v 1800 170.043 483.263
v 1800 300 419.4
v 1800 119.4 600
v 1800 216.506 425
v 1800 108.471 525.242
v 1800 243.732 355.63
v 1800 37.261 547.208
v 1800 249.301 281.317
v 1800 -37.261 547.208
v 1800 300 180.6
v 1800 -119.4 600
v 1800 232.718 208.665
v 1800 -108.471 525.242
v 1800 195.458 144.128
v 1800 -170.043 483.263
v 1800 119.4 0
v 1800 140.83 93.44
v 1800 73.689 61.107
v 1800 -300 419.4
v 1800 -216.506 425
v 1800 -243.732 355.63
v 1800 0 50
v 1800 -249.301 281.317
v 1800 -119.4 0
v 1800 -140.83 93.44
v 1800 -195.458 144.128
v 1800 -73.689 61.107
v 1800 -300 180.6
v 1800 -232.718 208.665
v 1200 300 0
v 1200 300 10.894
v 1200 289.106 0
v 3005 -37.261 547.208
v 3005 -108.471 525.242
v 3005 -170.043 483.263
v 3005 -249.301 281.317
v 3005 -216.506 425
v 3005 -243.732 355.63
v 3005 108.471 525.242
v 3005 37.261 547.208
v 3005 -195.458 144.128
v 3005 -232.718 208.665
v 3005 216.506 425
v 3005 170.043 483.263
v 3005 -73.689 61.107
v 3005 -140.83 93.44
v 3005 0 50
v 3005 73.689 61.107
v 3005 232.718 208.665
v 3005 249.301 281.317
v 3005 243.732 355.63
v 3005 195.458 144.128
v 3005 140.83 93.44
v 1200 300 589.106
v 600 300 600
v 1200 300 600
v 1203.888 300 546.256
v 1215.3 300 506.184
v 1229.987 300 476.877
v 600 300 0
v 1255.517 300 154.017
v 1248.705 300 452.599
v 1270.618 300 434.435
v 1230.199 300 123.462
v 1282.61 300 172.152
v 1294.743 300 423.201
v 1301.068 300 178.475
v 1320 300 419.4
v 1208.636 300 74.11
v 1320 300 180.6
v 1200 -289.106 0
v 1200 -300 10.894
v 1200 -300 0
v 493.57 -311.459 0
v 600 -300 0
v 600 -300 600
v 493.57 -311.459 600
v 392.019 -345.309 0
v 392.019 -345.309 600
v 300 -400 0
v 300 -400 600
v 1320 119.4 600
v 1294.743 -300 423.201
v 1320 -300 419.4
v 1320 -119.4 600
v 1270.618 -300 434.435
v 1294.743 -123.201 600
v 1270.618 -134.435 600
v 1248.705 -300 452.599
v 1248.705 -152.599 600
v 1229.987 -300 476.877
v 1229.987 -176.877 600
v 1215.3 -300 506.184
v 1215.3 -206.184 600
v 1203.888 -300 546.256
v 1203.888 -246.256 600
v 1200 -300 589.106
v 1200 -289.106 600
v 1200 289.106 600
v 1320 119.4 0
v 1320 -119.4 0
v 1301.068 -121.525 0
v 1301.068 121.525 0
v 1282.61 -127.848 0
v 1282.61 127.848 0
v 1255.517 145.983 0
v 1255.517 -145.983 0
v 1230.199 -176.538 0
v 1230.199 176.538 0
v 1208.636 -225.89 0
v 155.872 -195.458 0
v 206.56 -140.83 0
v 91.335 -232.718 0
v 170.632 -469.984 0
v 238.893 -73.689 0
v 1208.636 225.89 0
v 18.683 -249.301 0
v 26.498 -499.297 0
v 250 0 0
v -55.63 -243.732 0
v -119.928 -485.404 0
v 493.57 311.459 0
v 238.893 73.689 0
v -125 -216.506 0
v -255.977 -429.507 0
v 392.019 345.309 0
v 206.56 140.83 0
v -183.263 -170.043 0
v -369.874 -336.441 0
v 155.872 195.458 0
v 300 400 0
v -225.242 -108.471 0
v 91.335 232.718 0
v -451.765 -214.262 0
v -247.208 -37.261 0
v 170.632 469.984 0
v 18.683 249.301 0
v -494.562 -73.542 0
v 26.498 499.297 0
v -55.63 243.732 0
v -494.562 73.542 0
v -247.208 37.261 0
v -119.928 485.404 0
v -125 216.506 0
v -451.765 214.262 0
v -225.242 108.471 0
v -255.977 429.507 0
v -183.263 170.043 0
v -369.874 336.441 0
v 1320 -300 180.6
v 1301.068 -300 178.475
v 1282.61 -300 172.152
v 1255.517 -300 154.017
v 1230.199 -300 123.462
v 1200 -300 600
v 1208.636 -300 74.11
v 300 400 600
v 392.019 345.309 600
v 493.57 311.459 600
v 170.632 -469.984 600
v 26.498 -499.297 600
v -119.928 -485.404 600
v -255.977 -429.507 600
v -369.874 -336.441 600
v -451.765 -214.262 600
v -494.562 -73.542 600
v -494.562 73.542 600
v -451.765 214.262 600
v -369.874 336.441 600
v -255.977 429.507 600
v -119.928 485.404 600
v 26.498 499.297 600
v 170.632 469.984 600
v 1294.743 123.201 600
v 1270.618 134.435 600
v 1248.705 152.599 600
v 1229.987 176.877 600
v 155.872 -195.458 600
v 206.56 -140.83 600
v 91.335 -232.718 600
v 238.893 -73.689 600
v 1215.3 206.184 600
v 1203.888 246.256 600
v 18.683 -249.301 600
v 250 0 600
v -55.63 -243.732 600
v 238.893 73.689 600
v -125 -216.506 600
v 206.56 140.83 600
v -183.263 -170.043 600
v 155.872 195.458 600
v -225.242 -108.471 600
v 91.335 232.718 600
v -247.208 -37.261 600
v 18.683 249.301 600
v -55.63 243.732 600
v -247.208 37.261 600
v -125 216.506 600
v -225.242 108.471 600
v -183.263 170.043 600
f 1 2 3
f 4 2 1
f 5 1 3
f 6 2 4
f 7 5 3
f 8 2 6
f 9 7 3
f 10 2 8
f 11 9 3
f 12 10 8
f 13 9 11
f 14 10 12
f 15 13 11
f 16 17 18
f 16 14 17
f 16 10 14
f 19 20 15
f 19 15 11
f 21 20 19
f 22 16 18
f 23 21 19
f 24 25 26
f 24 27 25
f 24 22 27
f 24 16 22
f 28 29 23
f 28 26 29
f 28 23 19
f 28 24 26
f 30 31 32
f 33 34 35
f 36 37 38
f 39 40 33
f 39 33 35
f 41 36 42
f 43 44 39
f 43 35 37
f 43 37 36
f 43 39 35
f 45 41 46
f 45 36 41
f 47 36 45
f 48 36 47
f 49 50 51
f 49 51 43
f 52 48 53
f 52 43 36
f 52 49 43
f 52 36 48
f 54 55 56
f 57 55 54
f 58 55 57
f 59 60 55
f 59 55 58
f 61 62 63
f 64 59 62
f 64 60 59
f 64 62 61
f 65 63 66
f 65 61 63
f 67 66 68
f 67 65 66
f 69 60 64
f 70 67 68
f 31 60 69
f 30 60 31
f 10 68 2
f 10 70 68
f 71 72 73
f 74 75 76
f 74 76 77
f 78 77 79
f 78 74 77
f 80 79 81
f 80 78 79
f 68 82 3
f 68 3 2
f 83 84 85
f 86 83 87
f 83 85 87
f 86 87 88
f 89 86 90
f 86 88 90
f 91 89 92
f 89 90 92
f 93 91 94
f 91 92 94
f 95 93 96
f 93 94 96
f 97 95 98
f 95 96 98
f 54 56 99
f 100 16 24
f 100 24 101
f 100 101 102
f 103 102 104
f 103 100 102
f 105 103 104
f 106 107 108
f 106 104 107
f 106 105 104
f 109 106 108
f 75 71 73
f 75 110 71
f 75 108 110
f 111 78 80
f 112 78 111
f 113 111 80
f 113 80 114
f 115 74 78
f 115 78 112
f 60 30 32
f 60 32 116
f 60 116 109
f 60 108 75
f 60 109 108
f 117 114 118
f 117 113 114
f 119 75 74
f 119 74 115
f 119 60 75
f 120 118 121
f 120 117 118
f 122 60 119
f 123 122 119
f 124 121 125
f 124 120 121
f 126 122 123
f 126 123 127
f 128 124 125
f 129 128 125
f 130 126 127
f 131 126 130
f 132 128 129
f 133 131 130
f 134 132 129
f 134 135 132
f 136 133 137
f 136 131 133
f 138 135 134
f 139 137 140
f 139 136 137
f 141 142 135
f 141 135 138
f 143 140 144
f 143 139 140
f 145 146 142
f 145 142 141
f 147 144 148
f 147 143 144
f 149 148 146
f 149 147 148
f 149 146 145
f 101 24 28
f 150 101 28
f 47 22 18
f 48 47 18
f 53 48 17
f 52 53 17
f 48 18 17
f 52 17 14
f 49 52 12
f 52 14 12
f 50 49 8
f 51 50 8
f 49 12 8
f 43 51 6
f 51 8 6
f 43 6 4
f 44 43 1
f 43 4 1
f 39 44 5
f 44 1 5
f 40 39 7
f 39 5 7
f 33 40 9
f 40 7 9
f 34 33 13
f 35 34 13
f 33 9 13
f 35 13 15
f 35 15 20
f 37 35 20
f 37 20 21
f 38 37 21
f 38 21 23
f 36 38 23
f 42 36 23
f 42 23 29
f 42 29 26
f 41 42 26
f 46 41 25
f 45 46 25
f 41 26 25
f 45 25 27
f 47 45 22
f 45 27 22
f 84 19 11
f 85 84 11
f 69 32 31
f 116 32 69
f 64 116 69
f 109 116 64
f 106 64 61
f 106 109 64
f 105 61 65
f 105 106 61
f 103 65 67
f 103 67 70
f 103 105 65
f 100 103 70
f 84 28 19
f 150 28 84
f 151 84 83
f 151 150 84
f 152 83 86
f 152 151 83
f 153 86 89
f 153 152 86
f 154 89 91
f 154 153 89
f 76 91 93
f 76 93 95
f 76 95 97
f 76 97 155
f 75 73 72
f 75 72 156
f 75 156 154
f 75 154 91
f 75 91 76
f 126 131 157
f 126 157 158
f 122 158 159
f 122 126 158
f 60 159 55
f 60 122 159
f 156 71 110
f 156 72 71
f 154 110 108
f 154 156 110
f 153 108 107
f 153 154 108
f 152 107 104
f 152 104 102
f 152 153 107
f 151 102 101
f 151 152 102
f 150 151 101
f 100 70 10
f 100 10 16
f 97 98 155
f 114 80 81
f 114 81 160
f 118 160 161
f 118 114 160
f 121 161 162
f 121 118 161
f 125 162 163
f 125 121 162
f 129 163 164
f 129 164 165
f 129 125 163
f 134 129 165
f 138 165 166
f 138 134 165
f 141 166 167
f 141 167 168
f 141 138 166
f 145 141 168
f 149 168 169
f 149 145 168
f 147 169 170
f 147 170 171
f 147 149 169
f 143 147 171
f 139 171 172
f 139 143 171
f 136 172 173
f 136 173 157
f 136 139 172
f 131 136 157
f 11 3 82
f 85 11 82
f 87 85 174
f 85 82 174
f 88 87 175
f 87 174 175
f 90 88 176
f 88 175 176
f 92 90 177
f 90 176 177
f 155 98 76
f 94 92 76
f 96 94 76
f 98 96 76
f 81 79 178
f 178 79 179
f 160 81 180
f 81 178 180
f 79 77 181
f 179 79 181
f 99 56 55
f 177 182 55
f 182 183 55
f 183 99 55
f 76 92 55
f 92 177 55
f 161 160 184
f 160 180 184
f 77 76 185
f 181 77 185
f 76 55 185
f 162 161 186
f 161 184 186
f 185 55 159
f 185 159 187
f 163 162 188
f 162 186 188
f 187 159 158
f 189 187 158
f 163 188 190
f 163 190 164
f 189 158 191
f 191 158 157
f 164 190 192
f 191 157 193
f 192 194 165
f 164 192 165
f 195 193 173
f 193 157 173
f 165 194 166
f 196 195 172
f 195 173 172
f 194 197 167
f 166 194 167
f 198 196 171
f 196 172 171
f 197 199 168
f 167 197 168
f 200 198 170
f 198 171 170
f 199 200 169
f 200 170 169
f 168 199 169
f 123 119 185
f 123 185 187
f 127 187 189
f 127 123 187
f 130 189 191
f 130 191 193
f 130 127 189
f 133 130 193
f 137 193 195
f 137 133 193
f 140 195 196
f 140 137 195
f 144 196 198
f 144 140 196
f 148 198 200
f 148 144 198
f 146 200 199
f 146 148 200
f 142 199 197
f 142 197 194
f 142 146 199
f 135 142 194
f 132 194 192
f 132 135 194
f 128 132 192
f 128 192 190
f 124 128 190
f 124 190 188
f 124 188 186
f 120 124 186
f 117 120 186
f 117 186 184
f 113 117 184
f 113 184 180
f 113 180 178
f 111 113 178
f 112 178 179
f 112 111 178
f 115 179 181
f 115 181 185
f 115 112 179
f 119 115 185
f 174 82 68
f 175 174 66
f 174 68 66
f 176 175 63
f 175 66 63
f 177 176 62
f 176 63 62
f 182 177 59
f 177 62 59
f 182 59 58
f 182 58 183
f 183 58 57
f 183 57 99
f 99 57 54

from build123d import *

# Parameters (mm, degrees)
SKETCH2_R           = 250
BOSS_EXTRUDE1_DEPTH = 600
CUT_EXTRUDE1_DEPTH  = 600
SKETCH5_4_R         = 250
BOSS_EXTRUDE2_DEPTH = 1205
FILLET1_R           = 120


with BuildPart() as part:
    # Sketch2 → Boss-Extrude1 (new body)
    with BuildSketch(Plane.XY):
        with BuildLine():
            Line((600, 300), (1800, 300))
            Line((1800, 300), (1800, -300))
            Line((1800, -300), (600, -300))
            ThreePointArc((600, -300), (441.886116992, -325.658350975), (300, -400))
            ThreePointArc((300, -400), (-500, 0), (300, 400))
            ThreePointArc((300, 400), (441.886116992, 325.658350975), (600, 300))
        make_face()
        Circle(SKETCH2_R, mode=Mode.SUBTRACT)
    extrude(amount=BOSS_EXTRUDE1_DEPTH)

    # Sketch5 → Cut-Extrude1 (cut)
    with BuildSketch(Plane(origin=(1800, 0, 0), x_dir=(0, 0, -1), z_dir=(1, 0, 0))):
        Polygon((-600, 119.4), (-419.4, 300), (-600, 300), align=None)
        Polygon((-113.09603494, 300), (-117.263350095, 300), (-180.6, 300), (0, 119.4), (0, 300), align=None)
        Polygon((0, -300), (0, -119.4), (-180.6, -300), align=None)
        Polygon((-419.4, -300), (-600, -119.4), (-600, -300), align=None)
    extrude(amount=-CUT_EXTRUDE1_DEPTH, mode=Mode.SUBTRACT)

    # Sketch5_4 → Boss-Extrude2 (add)
    with BuildSketch(Plane(origin=(1800, 0, 0), x_dir=(0, 0, -1), z_dir=(1, 0, 0))):
        with Locations((-300, 0)):
            Circle(SKETCH5_4_R)
    extrude(amount=BOSS_EXTRUDE2_DEPTH)

    # Fillet1
    fillet1_edges = [part.edges().sort_by_distance(p)[0] for p in [
        (1200, -209.7, 509.7),
        (1200, -209.7, 90.3),
        (1200, 209.7, 90.3),
        (1200, 209.7, 509.7),
    ]]
    fillet(fillet1_edges, radius=FILLET1_R)


solid = part.part
